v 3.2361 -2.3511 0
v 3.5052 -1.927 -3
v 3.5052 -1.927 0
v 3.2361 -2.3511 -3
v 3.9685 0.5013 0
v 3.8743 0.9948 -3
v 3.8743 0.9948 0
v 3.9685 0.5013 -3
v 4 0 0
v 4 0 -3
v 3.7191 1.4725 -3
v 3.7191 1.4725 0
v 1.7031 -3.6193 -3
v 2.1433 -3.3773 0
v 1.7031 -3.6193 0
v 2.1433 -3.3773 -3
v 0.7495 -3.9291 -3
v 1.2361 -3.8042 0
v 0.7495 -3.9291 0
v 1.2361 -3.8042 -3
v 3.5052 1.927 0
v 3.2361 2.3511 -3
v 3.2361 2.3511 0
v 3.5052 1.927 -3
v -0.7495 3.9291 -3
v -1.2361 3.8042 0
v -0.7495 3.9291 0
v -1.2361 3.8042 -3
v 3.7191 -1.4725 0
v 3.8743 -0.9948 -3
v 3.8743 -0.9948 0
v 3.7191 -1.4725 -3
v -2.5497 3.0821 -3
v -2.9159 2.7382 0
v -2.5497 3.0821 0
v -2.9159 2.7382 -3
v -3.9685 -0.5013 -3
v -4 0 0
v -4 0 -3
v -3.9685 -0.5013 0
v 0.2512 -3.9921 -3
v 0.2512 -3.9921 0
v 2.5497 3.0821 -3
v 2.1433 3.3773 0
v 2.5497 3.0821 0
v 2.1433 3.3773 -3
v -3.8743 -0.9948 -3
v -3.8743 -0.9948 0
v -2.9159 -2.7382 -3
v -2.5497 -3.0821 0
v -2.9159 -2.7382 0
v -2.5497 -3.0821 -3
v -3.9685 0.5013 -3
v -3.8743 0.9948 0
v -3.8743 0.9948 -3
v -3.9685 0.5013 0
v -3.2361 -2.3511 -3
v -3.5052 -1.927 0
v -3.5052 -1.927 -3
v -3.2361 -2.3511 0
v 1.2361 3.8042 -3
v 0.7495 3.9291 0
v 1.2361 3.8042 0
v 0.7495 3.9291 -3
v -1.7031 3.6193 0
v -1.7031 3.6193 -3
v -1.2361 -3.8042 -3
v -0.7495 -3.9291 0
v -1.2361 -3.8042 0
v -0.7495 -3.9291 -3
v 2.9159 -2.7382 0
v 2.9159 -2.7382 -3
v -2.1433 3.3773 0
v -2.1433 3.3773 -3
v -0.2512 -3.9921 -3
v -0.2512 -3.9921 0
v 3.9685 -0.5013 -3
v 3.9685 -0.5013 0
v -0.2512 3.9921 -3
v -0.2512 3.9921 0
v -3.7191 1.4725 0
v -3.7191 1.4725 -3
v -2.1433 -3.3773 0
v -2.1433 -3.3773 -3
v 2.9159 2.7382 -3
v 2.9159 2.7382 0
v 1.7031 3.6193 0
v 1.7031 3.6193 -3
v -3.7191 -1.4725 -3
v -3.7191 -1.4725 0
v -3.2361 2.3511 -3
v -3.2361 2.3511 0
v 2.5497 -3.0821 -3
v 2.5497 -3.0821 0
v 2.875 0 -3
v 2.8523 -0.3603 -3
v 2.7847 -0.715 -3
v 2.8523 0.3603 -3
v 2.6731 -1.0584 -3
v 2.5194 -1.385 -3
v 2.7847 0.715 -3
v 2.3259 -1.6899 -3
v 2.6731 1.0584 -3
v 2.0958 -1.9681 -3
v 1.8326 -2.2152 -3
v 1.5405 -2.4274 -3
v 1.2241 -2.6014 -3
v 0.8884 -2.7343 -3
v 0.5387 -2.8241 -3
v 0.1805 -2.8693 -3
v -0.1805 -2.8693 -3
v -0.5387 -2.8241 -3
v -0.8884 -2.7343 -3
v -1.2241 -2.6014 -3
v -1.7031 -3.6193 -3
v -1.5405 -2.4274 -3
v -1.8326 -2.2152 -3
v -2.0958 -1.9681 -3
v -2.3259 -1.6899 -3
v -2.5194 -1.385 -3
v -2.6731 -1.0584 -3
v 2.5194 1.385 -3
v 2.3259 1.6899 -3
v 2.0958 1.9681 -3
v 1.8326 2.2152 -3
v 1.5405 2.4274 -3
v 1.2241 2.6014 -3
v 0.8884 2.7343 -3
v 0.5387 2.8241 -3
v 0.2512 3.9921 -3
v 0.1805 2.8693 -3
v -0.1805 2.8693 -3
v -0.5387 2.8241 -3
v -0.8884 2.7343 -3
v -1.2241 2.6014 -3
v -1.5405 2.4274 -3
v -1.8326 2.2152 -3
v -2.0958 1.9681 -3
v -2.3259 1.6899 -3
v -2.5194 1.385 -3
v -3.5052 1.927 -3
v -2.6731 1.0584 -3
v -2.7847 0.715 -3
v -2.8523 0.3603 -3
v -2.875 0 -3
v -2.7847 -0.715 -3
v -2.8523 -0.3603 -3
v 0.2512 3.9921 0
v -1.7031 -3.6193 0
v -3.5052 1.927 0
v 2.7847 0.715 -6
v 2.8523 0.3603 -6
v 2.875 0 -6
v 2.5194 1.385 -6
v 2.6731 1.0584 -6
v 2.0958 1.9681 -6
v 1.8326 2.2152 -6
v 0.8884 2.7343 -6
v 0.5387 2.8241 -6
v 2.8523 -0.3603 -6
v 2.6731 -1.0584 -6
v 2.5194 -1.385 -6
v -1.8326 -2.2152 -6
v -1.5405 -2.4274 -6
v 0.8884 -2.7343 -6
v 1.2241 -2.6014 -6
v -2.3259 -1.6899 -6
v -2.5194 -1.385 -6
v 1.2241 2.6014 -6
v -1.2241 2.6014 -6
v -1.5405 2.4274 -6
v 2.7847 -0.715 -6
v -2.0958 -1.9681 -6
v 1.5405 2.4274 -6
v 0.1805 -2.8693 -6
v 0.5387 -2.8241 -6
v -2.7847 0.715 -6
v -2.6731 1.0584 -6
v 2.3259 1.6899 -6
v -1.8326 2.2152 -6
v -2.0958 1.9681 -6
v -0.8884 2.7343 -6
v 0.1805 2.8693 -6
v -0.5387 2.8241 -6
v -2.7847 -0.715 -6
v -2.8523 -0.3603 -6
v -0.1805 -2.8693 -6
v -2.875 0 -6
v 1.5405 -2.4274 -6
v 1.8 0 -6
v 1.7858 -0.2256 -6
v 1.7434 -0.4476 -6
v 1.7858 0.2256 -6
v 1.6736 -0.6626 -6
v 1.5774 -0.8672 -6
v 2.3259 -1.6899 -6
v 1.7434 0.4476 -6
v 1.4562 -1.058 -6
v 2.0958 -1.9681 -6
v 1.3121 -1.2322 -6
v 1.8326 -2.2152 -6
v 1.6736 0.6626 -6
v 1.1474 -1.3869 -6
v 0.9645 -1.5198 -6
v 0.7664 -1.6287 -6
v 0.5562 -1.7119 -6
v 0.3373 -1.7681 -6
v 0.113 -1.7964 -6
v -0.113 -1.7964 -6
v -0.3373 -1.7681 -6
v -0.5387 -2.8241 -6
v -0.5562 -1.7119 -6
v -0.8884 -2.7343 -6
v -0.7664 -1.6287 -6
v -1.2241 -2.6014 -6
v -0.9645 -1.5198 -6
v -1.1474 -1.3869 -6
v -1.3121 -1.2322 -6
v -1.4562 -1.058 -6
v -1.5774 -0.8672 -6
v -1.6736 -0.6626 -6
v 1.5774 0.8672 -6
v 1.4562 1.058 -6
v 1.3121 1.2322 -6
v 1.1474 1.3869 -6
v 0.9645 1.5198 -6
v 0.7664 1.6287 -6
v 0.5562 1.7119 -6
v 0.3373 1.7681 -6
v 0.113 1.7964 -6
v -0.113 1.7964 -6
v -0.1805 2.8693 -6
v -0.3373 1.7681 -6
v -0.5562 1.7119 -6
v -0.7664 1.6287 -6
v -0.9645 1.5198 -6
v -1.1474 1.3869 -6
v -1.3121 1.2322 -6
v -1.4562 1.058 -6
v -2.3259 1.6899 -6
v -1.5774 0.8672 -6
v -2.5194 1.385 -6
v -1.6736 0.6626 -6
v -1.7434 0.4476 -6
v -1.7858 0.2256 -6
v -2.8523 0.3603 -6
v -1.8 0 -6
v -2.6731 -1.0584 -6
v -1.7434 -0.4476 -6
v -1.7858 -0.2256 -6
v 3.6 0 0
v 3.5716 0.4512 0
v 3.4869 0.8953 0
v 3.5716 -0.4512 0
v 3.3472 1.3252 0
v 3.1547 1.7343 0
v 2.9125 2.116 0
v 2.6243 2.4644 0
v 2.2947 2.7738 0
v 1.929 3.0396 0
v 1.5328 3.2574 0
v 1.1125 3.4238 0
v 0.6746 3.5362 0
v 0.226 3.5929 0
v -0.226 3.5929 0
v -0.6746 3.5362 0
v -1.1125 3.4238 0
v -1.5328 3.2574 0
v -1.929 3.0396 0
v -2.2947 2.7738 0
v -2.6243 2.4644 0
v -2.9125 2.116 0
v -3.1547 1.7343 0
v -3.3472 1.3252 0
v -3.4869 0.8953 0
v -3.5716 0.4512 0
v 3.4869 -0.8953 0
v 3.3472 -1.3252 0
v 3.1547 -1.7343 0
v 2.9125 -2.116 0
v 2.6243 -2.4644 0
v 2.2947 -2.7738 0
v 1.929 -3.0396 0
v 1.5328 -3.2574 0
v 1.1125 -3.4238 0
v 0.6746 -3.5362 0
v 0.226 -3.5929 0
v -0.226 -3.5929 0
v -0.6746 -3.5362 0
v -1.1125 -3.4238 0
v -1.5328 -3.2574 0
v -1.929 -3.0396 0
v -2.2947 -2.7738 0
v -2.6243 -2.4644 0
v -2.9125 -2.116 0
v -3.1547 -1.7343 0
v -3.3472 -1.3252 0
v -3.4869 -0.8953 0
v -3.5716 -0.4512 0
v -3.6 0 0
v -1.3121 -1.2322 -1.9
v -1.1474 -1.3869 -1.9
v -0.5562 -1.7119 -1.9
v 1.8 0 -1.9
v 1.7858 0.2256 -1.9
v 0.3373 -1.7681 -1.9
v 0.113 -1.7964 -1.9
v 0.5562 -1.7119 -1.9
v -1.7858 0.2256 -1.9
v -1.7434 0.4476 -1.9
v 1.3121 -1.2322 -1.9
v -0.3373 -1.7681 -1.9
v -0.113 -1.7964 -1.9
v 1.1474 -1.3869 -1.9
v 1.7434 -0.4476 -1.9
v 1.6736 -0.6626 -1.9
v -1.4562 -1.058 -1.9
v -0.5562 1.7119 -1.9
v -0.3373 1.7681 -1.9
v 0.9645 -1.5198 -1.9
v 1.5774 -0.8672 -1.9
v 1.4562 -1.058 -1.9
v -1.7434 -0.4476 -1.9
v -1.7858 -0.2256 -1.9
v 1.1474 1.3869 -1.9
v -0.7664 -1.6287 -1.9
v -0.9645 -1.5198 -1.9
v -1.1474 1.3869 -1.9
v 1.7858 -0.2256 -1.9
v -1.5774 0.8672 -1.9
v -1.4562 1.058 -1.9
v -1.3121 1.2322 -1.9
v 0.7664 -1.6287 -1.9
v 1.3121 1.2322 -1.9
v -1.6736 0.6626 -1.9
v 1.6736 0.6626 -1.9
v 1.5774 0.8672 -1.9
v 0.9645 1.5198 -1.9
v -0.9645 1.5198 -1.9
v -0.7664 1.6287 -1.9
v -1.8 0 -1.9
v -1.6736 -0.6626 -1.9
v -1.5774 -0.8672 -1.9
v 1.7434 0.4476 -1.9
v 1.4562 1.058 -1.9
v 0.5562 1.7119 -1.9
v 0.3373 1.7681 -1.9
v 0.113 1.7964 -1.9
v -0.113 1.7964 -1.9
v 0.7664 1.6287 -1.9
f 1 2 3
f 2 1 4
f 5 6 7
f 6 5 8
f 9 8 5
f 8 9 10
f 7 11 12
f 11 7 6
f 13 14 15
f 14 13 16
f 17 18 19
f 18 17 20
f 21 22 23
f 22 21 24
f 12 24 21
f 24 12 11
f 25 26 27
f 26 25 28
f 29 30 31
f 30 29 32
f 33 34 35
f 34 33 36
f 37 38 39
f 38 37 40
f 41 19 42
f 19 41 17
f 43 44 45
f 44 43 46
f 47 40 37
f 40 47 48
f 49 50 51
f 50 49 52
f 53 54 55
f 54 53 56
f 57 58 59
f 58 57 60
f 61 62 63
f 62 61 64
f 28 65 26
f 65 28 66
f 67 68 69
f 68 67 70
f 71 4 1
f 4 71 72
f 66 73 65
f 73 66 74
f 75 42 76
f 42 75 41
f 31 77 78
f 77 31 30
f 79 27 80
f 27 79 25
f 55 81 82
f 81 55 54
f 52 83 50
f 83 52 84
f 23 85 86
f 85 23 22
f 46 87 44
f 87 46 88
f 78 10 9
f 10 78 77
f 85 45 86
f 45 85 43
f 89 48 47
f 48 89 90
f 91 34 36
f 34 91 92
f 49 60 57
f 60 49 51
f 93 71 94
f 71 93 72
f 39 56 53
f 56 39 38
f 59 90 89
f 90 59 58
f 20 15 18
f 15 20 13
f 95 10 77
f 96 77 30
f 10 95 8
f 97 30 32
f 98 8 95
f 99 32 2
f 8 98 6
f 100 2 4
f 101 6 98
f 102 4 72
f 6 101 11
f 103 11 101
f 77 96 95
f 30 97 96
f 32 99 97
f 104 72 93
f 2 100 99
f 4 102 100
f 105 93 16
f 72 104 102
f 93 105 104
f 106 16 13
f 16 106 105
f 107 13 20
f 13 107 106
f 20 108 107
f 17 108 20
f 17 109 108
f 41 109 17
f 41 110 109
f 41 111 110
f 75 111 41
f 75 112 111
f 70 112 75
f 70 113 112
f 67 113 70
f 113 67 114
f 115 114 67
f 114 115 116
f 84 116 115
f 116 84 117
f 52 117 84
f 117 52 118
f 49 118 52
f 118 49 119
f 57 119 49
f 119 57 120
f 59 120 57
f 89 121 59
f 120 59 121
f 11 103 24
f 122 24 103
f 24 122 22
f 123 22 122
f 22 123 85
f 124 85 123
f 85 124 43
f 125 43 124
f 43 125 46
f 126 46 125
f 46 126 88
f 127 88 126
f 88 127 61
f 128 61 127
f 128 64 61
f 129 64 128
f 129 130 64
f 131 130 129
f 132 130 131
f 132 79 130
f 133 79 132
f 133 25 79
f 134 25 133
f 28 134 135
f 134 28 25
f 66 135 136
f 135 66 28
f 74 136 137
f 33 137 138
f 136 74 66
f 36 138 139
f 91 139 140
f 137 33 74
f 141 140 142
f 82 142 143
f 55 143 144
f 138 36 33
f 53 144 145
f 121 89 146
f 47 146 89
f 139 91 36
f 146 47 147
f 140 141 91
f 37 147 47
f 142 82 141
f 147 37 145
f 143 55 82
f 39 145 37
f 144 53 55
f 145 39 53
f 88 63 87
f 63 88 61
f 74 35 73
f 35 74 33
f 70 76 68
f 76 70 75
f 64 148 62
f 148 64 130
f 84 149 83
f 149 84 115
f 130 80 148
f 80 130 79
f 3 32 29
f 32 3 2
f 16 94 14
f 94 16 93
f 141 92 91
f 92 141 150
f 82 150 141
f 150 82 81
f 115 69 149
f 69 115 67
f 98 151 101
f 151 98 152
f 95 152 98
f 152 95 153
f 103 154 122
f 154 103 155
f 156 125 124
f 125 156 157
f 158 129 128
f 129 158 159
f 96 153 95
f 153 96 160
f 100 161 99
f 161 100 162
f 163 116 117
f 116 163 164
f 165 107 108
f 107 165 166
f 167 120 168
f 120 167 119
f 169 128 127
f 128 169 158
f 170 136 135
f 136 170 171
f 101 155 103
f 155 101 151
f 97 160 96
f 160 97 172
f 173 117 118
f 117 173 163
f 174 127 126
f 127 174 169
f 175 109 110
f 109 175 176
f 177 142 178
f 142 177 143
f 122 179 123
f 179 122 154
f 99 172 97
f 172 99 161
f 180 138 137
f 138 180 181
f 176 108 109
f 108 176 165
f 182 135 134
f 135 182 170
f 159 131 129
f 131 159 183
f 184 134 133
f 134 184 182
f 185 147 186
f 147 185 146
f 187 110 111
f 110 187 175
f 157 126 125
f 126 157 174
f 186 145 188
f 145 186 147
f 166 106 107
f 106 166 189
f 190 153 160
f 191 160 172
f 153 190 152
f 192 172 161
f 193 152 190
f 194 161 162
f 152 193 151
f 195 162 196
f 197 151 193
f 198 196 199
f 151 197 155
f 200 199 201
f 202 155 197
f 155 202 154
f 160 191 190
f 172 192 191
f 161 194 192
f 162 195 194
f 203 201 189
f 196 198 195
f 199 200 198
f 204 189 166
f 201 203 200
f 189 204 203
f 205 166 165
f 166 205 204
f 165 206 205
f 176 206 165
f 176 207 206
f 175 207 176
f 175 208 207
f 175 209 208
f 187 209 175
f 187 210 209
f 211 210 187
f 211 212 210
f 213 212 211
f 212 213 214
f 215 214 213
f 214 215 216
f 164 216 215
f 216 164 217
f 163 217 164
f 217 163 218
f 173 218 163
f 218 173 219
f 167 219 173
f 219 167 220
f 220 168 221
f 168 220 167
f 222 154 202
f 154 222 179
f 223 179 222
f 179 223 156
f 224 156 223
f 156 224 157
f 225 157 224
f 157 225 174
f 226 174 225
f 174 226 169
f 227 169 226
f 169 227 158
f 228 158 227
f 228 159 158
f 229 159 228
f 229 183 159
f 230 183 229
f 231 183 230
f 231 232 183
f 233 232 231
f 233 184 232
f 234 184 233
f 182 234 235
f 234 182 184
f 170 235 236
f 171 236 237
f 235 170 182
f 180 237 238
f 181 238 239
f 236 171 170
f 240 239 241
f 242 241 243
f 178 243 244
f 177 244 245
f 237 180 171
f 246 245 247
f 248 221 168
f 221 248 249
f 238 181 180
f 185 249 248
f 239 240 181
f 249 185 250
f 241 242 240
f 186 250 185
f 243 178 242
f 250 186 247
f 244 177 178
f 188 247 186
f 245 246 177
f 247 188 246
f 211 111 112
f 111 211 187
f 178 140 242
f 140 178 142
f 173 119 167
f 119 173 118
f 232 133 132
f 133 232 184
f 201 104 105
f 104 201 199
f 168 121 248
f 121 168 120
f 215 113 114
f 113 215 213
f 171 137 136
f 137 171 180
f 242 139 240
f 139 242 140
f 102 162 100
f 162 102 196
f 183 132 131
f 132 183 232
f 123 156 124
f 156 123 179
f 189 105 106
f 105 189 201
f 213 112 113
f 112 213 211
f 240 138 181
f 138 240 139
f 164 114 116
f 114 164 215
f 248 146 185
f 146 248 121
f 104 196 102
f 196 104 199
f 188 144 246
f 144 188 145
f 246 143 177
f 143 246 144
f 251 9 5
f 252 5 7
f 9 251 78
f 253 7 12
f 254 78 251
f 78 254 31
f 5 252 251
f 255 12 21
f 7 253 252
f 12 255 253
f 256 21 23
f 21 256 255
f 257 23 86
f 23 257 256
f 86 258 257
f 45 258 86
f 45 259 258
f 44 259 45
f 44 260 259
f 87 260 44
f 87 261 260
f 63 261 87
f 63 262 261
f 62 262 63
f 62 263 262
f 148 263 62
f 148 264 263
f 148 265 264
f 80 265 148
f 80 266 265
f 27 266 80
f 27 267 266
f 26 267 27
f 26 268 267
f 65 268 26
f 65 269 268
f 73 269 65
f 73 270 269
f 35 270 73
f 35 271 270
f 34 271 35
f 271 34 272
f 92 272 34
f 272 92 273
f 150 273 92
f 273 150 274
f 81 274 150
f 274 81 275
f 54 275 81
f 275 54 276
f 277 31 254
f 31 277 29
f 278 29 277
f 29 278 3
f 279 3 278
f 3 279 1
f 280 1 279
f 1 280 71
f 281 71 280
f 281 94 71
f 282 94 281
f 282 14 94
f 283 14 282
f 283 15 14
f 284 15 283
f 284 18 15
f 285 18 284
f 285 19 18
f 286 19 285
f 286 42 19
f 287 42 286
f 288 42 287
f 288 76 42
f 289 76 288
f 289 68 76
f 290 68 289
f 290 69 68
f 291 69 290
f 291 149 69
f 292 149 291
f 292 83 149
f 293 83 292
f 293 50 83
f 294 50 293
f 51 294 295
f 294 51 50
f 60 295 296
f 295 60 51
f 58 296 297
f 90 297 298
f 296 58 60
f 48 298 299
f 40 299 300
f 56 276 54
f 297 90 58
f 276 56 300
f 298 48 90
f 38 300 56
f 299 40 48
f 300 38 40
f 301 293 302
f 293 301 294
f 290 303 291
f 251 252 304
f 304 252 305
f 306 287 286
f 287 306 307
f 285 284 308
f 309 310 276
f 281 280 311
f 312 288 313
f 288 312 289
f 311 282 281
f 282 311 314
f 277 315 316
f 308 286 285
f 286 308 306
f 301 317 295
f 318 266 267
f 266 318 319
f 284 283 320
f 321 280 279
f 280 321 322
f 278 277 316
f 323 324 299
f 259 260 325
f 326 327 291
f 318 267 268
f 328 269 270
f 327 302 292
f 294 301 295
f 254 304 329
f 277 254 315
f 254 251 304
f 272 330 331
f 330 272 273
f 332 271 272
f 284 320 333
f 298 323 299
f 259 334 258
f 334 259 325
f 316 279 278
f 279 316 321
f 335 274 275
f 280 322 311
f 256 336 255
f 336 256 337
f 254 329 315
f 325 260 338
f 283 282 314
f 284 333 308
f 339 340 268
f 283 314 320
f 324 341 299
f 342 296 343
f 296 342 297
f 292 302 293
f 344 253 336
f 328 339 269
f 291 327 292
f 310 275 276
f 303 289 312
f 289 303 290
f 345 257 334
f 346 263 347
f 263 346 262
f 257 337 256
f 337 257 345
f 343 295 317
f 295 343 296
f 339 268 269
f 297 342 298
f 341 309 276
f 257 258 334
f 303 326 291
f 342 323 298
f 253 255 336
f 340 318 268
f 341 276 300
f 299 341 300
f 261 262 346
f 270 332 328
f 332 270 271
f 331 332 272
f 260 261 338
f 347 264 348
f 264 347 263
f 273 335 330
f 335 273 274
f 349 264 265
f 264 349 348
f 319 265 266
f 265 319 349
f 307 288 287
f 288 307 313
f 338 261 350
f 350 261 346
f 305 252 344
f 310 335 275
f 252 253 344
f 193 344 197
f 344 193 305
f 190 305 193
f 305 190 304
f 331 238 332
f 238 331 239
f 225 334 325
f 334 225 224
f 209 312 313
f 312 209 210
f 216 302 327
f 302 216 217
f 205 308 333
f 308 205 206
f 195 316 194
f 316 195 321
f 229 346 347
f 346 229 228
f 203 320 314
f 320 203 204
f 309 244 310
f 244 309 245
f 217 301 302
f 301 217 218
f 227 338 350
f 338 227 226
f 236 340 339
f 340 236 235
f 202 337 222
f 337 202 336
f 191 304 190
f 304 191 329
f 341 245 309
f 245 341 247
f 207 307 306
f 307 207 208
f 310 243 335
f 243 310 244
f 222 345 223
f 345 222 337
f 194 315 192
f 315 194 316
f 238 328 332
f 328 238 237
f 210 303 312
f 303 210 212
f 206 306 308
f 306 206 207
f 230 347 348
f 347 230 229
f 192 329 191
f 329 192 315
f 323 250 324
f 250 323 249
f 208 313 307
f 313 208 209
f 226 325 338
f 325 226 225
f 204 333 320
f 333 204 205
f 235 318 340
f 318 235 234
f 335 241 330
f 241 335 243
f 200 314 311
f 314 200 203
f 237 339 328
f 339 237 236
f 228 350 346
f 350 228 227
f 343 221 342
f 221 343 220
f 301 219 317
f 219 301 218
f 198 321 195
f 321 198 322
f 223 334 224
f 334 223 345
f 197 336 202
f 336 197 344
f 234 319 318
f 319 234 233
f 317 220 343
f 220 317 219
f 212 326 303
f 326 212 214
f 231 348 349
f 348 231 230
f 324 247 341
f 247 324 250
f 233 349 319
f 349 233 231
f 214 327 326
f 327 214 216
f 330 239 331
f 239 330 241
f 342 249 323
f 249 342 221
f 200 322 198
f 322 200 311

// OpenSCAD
$fn = 50;

difference() {
	union() {
		translate(v = [0, 0, -3.0]) {
			cylinder(h = 6, r = 4.0);
		}
		#translate(v = [0, 0, -6.0]) {
			cylinder(h = 6, r = 2.875);
		}
	}
	union() {
		translate(v = [0, 0, 0]) {
			rotate(a = [0, 0, 0]) {
				difference() {
					union() {
						translate(v = [0, 0, -6.0]) {
							cylinder(h = 6, r = 1.5);
						}
						translate(v = [0, 0, -1.9]) {
							cylinder(h = 1.9, r1 = 1.8, r2 = 3.6);
						}
						translate(v = [0, 0, -6.0]) {
							cylinder(h = 6, r = 1.8);
						}
						translate(v = [0, 0, -6.0]) {
							cylinder(h = 6, r = 1.5);
						}
					}
					union();
				}
			}
		}
		#cylinder(h = 3, r = 5.0);
	}
}
